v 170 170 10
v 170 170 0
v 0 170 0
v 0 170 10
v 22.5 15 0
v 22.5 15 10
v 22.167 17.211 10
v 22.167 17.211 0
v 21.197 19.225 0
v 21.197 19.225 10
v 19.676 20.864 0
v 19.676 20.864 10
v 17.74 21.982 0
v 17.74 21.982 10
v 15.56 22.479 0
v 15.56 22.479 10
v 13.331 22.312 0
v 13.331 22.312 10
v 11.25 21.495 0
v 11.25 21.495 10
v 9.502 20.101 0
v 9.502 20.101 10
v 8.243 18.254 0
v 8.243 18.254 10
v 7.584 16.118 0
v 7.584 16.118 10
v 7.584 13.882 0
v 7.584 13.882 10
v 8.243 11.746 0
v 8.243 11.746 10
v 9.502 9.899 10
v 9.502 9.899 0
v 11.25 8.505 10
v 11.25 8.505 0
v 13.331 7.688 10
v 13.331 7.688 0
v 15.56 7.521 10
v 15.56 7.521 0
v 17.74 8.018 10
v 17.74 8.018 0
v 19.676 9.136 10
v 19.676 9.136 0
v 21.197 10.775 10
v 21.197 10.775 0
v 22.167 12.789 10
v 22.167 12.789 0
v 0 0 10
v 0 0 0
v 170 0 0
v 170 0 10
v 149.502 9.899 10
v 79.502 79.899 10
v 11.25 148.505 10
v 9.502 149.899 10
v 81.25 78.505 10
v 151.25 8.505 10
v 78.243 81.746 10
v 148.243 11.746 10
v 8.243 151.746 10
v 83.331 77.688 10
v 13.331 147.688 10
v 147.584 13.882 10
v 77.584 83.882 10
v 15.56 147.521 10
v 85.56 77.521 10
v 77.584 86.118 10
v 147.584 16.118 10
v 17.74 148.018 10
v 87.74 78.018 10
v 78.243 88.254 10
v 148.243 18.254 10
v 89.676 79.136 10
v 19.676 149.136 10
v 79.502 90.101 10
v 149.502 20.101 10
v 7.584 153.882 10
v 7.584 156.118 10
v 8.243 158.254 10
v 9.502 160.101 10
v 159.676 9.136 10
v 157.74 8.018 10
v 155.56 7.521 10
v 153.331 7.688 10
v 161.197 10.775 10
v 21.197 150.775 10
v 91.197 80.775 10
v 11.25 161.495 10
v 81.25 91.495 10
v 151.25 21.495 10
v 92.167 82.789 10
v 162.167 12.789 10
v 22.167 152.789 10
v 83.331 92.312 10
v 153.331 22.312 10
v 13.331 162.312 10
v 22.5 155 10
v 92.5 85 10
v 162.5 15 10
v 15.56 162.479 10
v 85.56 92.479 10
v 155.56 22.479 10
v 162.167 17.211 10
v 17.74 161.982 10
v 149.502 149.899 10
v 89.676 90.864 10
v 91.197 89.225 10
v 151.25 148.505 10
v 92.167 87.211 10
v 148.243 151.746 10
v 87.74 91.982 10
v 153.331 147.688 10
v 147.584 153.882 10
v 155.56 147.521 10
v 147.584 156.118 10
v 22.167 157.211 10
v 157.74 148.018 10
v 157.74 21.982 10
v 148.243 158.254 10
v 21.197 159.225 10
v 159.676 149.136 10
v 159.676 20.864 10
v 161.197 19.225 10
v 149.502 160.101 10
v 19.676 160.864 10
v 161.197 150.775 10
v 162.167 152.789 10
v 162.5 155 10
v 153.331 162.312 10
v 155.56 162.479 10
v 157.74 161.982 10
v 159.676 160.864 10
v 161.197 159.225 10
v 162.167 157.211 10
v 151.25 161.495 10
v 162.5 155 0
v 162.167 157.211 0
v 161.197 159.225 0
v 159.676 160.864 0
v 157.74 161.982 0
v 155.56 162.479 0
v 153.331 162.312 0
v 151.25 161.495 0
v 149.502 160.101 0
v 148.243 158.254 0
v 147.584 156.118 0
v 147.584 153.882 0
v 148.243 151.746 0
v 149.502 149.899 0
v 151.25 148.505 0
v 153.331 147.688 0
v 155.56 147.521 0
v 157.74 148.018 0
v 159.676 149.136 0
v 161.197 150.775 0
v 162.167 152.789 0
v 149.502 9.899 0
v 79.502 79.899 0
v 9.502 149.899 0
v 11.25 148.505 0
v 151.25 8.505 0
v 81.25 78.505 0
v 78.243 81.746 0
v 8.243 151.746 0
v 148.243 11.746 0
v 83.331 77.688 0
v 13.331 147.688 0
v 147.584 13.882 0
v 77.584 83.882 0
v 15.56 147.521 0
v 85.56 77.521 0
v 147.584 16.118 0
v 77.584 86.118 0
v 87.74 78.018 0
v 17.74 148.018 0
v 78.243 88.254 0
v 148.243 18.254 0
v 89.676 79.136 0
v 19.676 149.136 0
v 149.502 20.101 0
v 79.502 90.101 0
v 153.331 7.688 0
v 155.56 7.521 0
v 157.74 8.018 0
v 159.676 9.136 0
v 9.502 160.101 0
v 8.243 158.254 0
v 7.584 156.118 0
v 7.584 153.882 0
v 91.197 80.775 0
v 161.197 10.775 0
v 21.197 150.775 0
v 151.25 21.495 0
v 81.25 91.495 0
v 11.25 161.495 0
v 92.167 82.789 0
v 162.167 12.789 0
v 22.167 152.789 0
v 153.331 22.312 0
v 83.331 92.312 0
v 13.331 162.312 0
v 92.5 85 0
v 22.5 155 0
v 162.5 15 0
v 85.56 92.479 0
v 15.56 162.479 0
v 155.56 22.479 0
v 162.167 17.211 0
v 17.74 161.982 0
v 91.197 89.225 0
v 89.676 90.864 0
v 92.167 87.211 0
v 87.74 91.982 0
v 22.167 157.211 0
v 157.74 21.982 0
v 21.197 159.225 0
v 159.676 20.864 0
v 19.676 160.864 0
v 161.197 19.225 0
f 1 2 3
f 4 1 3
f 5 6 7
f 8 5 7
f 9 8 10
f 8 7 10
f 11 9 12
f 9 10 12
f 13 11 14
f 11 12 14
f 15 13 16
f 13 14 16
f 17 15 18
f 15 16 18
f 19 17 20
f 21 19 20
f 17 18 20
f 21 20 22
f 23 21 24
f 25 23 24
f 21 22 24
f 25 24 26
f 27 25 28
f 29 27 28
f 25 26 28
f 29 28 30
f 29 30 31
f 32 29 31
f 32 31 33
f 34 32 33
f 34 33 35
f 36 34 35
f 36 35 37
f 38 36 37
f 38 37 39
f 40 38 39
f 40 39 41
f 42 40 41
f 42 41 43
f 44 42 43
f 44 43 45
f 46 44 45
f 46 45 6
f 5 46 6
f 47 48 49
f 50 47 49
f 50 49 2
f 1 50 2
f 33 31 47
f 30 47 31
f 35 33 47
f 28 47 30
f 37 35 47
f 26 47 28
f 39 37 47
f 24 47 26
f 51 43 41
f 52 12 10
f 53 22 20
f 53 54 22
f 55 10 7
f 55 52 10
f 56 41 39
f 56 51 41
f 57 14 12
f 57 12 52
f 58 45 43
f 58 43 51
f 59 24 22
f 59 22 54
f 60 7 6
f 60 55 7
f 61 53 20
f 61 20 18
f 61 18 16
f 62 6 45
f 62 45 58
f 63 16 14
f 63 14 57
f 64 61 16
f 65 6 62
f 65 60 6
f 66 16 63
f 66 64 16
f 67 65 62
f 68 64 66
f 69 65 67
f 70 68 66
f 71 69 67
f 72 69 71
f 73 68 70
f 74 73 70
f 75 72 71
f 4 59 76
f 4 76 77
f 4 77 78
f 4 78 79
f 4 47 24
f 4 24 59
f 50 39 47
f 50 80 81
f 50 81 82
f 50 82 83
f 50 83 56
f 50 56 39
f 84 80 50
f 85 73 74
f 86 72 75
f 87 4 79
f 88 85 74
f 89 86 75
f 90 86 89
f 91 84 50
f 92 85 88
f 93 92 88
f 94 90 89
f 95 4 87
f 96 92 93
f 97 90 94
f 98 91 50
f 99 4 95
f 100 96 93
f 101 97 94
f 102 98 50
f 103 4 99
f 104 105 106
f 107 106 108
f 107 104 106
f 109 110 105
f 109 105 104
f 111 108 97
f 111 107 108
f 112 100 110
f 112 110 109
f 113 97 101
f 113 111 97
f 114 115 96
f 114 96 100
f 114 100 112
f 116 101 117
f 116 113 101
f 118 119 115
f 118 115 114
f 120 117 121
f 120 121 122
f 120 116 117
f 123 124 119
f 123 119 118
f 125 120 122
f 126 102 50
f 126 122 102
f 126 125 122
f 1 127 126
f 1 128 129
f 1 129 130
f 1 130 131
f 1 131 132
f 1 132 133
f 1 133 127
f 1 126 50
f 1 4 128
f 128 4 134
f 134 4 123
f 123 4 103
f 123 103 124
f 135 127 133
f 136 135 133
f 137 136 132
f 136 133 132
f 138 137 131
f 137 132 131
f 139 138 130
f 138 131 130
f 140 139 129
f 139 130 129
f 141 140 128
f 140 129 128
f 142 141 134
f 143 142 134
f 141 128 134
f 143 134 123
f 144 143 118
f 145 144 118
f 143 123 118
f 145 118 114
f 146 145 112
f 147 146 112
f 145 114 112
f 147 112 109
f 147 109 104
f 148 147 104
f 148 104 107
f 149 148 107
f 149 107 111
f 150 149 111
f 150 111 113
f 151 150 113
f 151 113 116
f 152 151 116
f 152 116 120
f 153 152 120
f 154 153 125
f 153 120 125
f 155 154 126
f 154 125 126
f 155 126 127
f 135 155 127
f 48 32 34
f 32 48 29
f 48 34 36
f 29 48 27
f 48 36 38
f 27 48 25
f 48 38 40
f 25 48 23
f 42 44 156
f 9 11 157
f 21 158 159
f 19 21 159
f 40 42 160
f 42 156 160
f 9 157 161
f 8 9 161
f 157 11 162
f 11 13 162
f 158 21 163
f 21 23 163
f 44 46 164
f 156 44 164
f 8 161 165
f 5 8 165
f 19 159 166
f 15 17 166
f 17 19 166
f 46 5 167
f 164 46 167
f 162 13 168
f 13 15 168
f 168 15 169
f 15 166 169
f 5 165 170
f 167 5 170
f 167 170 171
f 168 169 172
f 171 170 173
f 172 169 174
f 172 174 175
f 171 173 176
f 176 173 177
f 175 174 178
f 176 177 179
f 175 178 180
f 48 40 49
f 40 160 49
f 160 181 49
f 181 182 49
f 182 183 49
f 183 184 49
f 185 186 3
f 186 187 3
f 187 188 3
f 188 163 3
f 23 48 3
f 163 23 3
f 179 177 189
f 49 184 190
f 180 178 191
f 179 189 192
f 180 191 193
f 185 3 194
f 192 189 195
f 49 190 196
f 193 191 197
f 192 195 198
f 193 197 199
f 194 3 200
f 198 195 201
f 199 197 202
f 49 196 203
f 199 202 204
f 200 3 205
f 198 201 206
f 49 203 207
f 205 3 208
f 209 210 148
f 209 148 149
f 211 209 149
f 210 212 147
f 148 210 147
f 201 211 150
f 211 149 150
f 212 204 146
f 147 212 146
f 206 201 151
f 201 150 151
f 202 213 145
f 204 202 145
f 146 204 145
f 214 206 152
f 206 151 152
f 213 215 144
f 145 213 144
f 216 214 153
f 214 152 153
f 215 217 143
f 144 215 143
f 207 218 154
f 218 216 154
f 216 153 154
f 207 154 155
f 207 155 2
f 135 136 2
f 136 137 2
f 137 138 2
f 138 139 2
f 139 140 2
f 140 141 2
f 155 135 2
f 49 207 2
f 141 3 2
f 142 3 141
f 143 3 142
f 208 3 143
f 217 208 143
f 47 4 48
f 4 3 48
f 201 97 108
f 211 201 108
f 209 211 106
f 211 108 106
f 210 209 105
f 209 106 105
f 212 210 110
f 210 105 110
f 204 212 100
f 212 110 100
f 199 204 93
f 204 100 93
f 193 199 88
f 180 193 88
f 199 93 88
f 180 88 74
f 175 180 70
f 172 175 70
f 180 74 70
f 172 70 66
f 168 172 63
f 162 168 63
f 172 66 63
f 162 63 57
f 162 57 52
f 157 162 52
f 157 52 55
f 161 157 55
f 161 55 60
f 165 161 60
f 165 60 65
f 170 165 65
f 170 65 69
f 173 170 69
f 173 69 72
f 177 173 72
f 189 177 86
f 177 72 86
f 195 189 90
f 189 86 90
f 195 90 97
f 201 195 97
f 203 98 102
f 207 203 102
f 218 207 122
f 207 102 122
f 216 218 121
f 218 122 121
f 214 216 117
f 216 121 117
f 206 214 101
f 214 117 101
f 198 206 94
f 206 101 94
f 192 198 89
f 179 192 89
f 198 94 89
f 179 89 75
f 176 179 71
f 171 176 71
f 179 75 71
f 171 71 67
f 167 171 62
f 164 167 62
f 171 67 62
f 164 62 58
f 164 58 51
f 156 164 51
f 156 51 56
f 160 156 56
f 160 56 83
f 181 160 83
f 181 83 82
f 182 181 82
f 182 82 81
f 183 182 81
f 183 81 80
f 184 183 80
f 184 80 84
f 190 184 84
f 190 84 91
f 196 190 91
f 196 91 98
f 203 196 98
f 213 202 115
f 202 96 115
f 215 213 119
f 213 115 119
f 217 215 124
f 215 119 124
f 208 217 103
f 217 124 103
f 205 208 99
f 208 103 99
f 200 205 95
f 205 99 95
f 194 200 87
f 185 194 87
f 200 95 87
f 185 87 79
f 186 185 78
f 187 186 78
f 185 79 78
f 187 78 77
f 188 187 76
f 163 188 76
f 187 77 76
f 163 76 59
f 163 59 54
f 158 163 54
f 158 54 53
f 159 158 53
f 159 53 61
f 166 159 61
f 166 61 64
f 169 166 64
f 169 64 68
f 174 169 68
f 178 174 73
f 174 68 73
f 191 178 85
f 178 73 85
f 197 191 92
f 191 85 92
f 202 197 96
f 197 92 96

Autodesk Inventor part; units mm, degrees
ref_plane "YZ Plane" through (0, 0, 0) normal (1, 0, 0) x (0, 1, 0)
ref_plane "XZ Plane" through (0, 0, 0) normal (0, 1, 0) x (-1, 0, 0)
ref_plane "XY Plane" through (0, 0, 0) normal (0, 0, 1) x (1, 0, 0)
sketch "Sketch1" plane through (0, 0, 0) normal (0, 0, 1) x (1, 0, 0)
  line L0 (0, 0) -> (170, 0)
  line L1 (170, 0) -> (170, 170)
  line L2 (170, 170) -> (0, 170)
  line L3 (0, 170) -> (0, 0)
  dimension "d0" = 170
  dimension "d1" = 170
extrude "Extrusion1" add sketch "Sketch1" along normal blind 10
sketch "Sketch2" plane through (0, 0, 10) normal (0, 0, 1) x (1, 0, 0)
  line L0 (170, 170) -> (0, 170) projected
  line L1 (0, 170) -> (0, 155)
  line L2 (0, 170) -> (0, 0) projected
  line L3 (0, 0) -> (170, 0) projected
  line L4 (0, 0) -> (0, 15)
  line L5 (0, 15) -> (155, 15)
  line L6 (155, 15) -> (155, 155)
  line L7 (155, 155) -> (15, 155)
  line L8 (15, 155) -> (15, 15)
  line L9 (15, 155) -> (30, 155)
  circle A0 centre (15, 155) radius 7.5
  circle A1 centre (155, 155) radius 7.5
  circle A2 centre (155, 15) radius 7.5
  circle A3 centre (15, 15) radius 7.5
  dimension "d4" = 15
  dimension "d5" = 15
  dimension "d6" = 155
  dimension "d7" = 140
  dimension "d8" = 140
  dimension "d9" = 140
  dimension "d10" = 15
  dimension "d11" = 15
  dimension "d12" = 15
  dimension "d13" = 15
extrude "Extrusion2" cut sketch "Sketch2" against normal blind 10 contours L8 A3 L5 | L5 A3 | L5 A3 L8 | A2 L6 L5 | L5 L6 A2 | A0 L7 L8 | L8 L7 A0 | A1 L7 L6 | L6 L7 A1
sketch "Sketch3" plane through (0, 0, 10) normal (0, 0, 1) x (1, 0, 0)
  line L0 (170, 170) -> (0, 170) projected
  line L1 (0, 170) -> (85, 170)
  line L2 (85, 170) -> (85, 85)
  circle A0 centre (85, 85) radius 7.5
  point P0 (0, 0)
  dimension "d16" = 85
  dimension "d17" = 85
  dimension "d18" = 15
extrude "Extrusion3" cut sketch "Sketch3" against normal blind 10
properties part number "AB"
